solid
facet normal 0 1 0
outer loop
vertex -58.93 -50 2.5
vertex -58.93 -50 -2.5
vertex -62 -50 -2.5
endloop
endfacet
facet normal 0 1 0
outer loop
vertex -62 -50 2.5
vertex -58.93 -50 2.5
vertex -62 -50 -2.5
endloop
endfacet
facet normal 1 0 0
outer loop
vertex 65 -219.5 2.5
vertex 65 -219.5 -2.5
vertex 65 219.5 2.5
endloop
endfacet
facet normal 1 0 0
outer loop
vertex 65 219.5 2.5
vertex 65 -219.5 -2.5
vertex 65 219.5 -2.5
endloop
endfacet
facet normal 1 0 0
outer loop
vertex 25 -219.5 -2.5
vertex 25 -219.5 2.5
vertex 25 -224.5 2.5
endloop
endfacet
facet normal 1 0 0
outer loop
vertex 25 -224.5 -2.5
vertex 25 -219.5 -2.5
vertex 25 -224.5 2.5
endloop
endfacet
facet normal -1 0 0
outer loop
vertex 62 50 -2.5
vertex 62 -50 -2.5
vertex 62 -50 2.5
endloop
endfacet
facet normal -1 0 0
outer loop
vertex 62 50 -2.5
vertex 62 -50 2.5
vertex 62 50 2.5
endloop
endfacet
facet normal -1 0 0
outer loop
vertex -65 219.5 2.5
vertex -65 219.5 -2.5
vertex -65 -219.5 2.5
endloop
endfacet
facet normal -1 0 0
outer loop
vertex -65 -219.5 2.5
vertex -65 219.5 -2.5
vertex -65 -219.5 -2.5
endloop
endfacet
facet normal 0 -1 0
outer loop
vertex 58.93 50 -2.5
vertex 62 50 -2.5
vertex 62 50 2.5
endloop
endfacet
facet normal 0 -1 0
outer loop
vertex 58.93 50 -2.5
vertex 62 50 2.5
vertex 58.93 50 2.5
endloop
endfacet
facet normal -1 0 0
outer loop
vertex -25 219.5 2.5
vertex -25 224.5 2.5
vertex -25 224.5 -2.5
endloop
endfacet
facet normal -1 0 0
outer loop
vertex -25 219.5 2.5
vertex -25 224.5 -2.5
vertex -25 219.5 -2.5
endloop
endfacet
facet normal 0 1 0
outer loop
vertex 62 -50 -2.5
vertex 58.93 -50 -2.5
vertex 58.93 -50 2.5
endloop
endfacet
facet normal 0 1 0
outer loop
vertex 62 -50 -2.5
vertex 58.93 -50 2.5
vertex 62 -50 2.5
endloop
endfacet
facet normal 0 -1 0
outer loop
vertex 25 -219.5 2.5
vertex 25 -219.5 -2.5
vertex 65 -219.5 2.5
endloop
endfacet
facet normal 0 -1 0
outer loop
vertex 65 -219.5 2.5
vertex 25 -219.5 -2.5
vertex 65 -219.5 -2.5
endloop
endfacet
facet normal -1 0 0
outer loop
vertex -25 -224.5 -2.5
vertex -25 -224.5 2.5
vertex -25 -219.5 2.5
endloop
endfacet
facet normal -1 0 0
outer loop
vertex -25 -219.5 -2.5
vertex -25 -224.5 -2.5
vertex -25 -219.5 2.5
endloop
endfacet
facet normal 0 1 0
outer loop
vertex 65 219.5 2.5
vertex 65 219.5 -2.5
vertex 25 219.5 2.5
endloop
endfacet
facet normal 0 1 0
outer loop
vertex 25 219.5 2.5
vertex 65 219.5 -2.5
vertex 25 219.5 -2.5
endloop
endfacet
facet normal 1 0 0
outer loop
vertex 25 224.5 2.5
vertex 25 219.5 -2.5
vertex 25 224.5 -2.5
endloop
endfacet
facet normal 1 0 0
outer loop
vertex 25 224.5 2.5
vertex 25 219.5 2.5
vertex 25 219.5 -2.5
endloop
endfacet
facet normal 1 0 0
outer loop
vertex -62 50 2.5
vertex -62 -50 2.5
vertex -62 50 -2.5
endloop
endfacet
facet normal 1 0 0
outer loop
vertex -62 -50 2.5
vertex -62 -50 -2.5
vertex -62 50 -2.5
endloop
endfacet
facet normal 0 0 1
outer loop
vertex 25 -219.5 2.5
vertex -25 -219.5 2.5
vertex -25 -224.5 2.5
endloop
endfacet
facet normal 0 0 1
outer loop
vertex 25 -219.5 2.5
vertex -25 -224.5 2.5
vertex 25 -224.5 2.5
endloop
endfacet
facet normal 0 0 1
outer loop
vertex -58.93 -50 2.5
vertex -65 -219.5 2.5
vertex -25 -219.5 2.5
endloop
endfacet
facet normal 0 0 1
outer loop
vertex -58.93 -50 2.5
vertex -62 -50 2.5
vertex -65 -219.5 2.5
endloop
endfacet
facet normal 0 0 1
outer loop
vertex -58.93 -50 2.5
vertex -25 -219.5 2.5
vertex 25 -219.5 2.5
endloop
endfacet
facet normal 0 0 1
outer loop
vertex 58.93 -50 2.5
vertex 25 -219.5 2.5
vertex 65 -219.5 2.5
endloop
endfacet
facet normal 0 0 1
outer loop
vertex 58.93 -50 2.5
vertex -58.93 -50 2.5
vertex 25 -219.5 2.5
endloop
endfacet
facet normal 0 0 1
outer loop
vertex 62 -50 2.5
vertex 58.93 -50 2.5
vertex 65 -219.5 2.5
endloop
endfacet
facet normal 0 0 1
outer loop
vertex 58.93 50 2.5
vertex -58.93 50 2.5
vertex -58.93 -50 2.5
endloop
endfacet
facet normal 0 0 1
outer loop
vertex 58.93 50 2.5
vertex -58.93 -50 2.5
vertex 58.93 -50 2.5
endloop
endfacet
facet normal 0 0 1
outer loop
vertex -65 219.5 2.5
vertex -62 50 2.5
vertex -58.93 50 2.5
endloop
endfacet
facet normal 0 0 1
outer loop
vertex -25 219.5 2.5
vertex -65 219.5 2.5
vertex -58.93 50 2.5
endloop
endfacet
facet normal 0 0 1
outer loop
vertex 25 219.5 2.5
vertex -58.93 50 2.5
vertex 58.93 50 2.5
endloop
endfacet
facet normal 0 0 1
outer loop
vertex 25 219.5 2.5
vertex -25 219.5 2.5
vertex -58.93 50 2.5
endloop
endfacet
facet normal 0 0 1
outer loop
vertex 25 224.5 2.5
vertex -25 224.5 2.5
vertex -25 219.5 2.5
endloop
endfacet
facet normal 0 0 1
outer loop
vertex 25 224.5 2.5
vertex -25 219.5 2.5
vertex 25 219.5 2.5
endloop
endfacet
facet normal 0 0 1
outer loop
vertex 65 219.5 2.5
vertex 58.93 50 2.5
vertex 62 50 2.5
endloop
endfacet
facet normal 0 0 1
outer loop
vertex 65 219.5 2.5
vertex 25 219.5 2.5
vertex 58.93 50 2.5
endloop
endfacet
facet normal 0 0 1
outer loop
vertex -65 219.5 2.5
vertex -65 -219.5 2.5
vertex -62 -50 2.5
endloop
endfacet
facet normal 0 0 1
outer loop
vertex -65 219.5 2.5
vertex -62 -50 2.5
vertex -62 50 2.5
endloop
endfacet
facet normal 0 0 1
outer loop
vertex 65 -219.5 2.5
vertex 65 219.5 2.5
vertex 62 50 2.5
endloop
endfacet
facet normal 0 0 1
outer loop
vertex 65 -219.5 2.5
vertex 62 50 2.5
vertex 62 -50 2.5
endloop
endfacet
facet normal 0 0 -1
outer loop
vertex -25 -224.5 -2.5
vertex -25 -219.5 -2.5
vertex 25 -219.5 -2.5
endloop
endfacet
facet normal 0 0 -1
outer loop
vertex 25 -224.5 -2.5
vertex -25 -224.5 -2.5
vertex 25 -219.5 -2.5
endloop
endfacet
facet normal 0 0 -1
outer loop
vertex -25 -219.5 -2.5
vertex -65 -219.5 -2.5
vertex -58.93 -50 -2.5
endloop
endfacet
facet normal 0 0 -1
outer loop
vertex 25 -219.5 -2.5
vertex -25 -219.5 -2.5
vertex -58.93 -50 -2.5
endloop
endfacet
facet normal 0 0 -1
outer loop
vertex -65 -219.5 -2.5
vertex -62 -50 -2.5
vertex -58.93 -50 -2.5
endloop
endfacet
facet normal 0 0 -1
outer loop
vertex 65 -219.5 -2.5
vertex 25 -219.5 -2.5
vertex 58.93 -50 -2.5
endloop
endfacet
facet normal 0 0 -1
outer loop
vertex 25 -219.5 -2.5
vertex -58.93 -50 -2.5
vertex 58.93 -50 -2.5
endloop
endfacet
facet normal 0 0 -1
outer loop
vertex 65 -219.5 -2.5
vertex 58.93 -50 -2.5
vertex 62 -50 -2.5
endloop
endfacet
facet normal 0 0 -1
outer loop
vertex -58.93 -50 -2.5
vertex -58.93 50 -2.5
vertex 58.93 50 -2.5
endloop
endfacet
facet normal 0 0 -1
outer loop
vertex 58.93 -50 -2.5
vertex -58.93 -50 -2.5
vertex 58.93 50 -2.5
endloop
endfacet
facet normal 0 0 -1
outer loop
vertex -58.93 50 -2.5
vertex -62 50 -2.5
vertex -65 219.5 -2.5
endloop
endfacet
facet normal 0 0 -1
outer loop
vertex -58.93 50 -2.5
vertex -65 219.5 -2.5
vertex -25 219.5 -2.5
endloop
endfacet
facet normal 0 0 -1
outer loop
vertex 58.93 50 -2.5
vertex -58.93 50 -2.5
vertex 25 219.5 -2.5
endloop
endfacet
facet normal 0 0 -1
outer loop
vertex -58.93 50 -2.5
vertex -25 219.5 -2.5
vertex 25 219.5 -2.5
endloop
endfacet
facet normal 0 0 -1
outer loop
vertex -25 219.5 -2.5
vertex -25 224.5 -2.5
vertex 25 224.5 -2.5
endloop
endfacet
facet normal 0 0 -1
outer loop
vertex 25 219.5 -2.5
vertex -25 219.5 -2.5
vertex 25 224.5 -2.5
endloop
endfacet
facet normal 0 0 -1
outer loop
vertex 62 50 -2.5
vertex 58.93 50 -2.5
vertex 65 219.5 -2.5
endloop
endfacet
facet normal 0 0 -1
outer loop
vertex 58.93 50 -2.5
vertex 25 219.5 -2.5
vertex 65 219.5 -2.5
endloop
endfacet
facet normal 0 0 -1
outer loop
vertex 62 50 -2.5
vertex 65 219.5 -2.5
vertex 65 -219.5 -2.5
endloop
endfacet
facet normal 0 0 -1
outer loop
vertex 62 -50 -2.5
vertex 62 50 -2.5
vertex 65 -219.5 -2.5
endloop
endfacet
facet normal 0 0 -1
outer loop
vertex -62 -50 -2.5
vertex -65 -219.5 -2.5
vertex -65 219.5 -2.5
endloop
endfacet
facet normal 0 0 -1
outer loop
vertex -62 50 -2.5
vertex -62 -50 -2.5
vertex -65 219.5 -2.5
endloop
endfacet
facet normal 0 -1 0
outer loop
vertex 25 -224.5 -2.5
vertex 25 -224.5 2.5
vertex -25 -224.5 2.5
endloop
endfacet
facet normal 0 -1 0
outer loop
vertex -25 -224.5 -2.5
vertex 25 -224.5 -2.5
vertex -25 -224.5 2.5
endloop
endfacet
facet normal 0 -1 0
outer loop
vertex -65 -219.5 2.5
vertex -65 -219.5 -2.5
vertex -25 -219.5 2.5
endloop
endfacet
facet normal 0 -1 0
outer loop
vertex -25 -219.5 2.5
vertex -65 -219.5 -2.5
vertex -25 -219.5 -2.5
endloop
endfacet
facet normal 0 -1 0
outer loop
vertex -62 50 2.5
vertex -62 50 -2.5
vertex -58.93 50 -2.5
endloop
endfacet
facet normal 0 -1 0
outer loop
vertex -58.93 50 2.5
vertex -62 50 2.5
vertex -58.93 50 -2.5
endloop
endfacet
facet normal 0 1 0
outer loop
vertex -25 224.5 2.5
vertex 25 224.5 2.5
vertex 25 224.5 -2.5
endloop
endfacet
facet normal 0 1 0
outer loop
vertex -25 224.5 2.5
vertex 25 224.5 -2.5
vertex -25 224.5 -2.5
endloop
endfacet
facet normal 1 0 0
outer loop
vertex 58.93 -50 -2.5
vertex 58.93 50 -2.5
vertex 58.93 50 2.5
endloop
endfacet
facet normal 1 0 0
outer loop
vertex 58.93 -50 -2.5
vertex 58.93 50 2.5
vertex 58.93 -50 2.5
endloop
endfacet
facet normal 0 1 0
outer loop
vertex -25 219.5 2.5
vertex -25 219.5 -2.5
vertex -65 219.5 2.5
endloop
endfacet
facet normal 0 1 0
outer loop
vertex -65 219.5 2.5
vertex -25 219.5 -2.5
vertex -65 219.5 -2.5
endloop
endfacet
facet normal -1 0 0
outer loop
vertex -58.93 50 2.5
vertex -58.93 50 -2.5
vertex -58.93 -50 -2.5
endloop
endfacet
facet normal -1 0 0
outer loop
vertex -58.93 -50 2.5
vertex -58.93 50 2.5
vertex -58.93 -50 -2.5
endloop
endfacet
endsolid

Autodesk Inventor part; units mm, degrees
ref_plane "YZ Plane" through (0, 0, 0) normal (1, 0, 0) x (0, 1, 0)
ref_plane "XZ Plane" through (0, 0, 0) normal (0, 1, 0) x (-1, 0, 0)
ref_plane "XY Plane" through (0, 0, 0) normal (0, 0, 1) x (1, 0, 0)
sketch "Sketch1" plane through (0, 0, 0) normal (0, 0, 1) x (1, 0, 0)
  line L0 (-65, -219.5) -> (65, -219.5)
  line L1 (65, -219.5) -> (65, 219.5)
  line L2 (65, 219.5) -> (-65, 219.5)
  line L3 (-65, 219.5) -> (-65, -219.5)
  line L4 (-65, -219.5) -> (65, 219.5) construction
  line L5 (65, -219.5) -> (-65, 219.5) construction
  line L6 (58.93, -50) -> (62, -50)
  line L7 (62, -50) -> (62, 50)
  line L8 (62, 50) -> (58.93, 50)
  line L9 (58.93, 50) -> (58.93, -50)
  line L10 (58.93, -50) -> (62, 50) construction
  line L11 (62, -50) -> (58.93, 50) construction
  line L12 (0, 219.5) -> (0, -219.5)
  line L13 (-58.93, -50) -> (-62, -50)
  line L14 (-62, -50) -> (-62, 50)
  line L15 (-62, 50) -> (-58.93, 50)
  line L16 (-58.93, 50) -> (-58.93, -50)
  line L17 (-58.93, -50) -> (-62, 50) construction
  line L18 (-62, -50) -> (-58.93, 50) construction
  point P0 (0, 0)
  point P1 (60.465, 0)
  point P2 (62, 0)
  point P3 (-60.465, 0)
  point P4 (-62, 0)
  point P5 (0, 0)
  dimension "d0" = 130
  dimension "d1" = 439
  dimension "d2" = 3.07
  dimension "d3" = 100
  dimension "d4" = 3
extrude "Extrusion1" add sketch "Sketch1" along normal mid plane 5
sketch "Sketch2" plane through (0, 0, 2.5) normal (0, 0, 1) x (1, 0, 0)
  line L0 (-25, 219.5) -> (25, 219.5)
  line L1 (25, 219.5) -> (25, 224.5)
  line L2 (25, 224.5) -> (-25, 224.5)
  line L3 (-25, 224.5) -> (-25, 219.5)
  line L4 (-58.93, -50) -> (-58.93, 50) projected
  line L5 (-58.93, 0) -> (58.93, 0)
  line L6 (58.93, -50) -> (58.93, 50) projected
  line L7 (-25, -219.5) -> (25, -219.5)
  line L8 (25, -219.5) -> (25, -224.5)
  line L9 (25, -224.5) -> (-25, -224.5)
  line L10 (-25, -224.5) -> (-25, -219.5)
  point P0 (0, 0)
  point P1 (-65, 219.5)
  point P2 (0, 224.5)
  point P3 (0, -224.5)
  dimension "d7" = 50
  dimension "d8" = 5
extrude "Extrusion2" add sketch "Sketch2" against normal blind 5
